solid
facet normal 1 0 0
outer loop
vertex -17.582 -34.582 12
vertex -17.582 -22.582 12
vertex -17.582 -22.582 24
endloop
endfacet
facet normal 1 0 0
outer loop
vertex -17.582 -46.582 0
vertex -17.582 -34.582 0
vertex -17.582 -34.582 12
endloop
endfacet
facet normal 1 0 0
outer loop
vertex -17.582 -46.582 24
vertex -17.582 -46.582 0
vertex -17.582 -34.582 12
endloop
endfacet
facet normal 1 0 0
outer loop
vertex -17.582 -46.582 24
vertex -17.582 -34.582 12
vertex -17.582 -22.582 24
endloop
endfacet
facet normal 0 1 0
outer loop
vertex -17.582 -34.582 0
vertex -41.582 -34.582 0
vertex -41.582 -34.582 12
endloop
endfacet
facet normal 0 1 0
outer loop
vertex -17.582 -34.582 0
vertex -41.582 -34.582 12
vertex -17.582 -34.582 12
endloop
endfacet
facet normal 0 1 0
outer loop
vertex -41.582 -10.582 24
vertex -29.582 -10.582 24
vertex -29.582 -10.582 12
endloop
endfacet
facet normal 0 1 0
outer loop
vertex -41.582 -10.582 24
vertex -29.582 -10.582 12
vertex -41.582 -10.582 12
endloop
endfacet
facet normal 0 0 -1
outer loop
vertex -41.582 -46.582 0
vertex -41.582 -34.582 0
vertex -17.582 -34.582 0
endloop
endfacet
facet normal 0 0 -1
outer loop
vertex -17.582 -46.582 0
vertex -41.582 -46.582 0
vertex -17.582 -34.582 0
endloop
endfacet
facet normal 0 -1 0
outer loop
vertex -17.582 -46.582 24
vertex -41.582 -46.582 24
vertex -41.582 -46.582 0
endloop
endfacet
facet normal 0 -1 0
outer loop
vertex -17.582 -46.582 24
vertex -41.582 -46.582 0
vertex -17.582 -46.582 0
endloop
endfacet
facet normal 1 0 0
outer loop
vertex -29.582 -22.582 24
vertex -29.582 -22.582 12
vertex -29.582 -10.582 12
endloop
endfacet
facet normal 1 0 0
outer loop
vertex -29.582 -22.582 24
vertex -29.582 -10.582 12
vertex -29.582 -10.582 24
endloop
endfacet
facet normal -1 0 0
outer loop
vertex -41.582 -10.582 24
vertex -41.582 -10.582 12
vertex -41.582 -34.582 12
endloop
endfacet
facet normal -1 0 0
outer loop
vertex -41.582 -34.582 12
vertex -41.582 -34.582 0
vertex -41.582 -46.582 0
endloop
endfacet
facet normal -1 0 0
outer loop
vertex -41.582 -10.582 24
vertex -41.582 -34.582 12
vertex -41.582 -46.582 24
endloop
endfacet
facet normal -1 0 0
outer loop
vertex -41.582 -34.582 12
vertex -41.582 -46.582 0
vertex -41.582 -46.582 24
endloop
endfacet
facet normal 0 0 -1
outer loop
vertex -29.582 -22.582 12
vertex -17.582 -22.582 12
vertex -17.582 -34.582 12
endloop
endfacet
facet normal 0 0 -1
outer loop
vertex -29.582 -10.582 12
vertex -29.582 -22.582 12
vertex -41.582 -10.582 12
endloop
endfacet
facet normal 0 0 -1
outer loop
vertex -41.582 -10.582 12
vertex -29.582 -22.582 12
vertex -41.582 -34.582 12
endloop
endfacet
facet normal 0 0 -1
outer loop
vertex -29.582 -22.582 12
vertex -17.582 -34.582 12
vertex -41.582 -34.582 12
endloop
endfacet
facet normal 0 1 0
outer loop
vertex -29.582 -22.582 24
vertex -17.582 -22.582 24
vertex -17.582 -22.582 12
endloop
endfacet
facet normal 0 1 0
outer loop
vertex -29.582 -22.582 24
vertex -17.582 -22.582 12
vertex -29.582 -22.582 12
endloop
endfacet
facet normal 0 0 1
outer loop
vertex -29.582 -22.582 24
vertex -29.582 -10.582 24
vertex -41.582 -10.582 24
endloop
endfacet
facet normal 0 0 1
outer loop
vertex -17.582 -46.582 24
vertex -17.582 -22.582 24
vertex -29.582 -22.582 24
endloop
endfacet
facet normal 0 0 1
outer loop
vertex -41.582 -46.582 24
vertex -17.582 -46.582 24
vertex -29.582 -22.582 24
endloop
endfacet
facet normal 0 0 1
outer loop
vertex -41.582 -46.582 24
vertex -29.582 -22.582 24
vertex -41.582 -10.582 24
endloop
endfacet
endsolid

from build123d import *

# Parameters (mm, degrees)
F0_W     = 12
F0_H     = 12
F1_DEPTH = 12
F2_W     = 24
F2_H     = 12
F3_DEPTH = 12
F4_W     = 24
F4_H     = 12
F5_DEPTH = 12
F6_W     = 12
F6_H     = 12
F7_DEPTH = 12


with BuildPart() as f1:
    # F0 (on Top) → F1 (new body)
    with BuildSketch(Plane.XY):
        with Locations((-35.581973, -40.582312)):
            Rectangle(F0_W, F0_H)
        with Locations((-23.581973, -40.582312)):
            Rectangle(F0_W, F0_H)
    extrude(amount=F1_DEPTH)

    # F2 (on face) → F3 (join)
    with BuildSketch(Plane.XY.offset(12)):
        with Locations((-29.581973, -40.582312)):
            Rectangle(F2_W, F2_H)
    extrude(amount=F3_DEPTH)

    # F4 (on face) → F5 (join)
    with BuildSketch(Plane(origin=(0, -34.582312, 0), x_dir=(-1, 0, 0), z_dir=(0, 1, 0))):
        with Locations((29.581973, 18)):
            Rectangle(F4_W, F4_H)
    extrude(amount=F5_DEPTH)

    # F6 (on face) → F7 (join)
    with BuildSketch(Plane(origin=(0, -22.582312, 0), x_dir=(-1, 0, 0), z_dir=(0, 1, 0))):
        with Locations((35.581973, 18)):
            Rectangle(F6_W, F6_H)
    extrude(amount=F7_DEPTH)


solid = f1.part
